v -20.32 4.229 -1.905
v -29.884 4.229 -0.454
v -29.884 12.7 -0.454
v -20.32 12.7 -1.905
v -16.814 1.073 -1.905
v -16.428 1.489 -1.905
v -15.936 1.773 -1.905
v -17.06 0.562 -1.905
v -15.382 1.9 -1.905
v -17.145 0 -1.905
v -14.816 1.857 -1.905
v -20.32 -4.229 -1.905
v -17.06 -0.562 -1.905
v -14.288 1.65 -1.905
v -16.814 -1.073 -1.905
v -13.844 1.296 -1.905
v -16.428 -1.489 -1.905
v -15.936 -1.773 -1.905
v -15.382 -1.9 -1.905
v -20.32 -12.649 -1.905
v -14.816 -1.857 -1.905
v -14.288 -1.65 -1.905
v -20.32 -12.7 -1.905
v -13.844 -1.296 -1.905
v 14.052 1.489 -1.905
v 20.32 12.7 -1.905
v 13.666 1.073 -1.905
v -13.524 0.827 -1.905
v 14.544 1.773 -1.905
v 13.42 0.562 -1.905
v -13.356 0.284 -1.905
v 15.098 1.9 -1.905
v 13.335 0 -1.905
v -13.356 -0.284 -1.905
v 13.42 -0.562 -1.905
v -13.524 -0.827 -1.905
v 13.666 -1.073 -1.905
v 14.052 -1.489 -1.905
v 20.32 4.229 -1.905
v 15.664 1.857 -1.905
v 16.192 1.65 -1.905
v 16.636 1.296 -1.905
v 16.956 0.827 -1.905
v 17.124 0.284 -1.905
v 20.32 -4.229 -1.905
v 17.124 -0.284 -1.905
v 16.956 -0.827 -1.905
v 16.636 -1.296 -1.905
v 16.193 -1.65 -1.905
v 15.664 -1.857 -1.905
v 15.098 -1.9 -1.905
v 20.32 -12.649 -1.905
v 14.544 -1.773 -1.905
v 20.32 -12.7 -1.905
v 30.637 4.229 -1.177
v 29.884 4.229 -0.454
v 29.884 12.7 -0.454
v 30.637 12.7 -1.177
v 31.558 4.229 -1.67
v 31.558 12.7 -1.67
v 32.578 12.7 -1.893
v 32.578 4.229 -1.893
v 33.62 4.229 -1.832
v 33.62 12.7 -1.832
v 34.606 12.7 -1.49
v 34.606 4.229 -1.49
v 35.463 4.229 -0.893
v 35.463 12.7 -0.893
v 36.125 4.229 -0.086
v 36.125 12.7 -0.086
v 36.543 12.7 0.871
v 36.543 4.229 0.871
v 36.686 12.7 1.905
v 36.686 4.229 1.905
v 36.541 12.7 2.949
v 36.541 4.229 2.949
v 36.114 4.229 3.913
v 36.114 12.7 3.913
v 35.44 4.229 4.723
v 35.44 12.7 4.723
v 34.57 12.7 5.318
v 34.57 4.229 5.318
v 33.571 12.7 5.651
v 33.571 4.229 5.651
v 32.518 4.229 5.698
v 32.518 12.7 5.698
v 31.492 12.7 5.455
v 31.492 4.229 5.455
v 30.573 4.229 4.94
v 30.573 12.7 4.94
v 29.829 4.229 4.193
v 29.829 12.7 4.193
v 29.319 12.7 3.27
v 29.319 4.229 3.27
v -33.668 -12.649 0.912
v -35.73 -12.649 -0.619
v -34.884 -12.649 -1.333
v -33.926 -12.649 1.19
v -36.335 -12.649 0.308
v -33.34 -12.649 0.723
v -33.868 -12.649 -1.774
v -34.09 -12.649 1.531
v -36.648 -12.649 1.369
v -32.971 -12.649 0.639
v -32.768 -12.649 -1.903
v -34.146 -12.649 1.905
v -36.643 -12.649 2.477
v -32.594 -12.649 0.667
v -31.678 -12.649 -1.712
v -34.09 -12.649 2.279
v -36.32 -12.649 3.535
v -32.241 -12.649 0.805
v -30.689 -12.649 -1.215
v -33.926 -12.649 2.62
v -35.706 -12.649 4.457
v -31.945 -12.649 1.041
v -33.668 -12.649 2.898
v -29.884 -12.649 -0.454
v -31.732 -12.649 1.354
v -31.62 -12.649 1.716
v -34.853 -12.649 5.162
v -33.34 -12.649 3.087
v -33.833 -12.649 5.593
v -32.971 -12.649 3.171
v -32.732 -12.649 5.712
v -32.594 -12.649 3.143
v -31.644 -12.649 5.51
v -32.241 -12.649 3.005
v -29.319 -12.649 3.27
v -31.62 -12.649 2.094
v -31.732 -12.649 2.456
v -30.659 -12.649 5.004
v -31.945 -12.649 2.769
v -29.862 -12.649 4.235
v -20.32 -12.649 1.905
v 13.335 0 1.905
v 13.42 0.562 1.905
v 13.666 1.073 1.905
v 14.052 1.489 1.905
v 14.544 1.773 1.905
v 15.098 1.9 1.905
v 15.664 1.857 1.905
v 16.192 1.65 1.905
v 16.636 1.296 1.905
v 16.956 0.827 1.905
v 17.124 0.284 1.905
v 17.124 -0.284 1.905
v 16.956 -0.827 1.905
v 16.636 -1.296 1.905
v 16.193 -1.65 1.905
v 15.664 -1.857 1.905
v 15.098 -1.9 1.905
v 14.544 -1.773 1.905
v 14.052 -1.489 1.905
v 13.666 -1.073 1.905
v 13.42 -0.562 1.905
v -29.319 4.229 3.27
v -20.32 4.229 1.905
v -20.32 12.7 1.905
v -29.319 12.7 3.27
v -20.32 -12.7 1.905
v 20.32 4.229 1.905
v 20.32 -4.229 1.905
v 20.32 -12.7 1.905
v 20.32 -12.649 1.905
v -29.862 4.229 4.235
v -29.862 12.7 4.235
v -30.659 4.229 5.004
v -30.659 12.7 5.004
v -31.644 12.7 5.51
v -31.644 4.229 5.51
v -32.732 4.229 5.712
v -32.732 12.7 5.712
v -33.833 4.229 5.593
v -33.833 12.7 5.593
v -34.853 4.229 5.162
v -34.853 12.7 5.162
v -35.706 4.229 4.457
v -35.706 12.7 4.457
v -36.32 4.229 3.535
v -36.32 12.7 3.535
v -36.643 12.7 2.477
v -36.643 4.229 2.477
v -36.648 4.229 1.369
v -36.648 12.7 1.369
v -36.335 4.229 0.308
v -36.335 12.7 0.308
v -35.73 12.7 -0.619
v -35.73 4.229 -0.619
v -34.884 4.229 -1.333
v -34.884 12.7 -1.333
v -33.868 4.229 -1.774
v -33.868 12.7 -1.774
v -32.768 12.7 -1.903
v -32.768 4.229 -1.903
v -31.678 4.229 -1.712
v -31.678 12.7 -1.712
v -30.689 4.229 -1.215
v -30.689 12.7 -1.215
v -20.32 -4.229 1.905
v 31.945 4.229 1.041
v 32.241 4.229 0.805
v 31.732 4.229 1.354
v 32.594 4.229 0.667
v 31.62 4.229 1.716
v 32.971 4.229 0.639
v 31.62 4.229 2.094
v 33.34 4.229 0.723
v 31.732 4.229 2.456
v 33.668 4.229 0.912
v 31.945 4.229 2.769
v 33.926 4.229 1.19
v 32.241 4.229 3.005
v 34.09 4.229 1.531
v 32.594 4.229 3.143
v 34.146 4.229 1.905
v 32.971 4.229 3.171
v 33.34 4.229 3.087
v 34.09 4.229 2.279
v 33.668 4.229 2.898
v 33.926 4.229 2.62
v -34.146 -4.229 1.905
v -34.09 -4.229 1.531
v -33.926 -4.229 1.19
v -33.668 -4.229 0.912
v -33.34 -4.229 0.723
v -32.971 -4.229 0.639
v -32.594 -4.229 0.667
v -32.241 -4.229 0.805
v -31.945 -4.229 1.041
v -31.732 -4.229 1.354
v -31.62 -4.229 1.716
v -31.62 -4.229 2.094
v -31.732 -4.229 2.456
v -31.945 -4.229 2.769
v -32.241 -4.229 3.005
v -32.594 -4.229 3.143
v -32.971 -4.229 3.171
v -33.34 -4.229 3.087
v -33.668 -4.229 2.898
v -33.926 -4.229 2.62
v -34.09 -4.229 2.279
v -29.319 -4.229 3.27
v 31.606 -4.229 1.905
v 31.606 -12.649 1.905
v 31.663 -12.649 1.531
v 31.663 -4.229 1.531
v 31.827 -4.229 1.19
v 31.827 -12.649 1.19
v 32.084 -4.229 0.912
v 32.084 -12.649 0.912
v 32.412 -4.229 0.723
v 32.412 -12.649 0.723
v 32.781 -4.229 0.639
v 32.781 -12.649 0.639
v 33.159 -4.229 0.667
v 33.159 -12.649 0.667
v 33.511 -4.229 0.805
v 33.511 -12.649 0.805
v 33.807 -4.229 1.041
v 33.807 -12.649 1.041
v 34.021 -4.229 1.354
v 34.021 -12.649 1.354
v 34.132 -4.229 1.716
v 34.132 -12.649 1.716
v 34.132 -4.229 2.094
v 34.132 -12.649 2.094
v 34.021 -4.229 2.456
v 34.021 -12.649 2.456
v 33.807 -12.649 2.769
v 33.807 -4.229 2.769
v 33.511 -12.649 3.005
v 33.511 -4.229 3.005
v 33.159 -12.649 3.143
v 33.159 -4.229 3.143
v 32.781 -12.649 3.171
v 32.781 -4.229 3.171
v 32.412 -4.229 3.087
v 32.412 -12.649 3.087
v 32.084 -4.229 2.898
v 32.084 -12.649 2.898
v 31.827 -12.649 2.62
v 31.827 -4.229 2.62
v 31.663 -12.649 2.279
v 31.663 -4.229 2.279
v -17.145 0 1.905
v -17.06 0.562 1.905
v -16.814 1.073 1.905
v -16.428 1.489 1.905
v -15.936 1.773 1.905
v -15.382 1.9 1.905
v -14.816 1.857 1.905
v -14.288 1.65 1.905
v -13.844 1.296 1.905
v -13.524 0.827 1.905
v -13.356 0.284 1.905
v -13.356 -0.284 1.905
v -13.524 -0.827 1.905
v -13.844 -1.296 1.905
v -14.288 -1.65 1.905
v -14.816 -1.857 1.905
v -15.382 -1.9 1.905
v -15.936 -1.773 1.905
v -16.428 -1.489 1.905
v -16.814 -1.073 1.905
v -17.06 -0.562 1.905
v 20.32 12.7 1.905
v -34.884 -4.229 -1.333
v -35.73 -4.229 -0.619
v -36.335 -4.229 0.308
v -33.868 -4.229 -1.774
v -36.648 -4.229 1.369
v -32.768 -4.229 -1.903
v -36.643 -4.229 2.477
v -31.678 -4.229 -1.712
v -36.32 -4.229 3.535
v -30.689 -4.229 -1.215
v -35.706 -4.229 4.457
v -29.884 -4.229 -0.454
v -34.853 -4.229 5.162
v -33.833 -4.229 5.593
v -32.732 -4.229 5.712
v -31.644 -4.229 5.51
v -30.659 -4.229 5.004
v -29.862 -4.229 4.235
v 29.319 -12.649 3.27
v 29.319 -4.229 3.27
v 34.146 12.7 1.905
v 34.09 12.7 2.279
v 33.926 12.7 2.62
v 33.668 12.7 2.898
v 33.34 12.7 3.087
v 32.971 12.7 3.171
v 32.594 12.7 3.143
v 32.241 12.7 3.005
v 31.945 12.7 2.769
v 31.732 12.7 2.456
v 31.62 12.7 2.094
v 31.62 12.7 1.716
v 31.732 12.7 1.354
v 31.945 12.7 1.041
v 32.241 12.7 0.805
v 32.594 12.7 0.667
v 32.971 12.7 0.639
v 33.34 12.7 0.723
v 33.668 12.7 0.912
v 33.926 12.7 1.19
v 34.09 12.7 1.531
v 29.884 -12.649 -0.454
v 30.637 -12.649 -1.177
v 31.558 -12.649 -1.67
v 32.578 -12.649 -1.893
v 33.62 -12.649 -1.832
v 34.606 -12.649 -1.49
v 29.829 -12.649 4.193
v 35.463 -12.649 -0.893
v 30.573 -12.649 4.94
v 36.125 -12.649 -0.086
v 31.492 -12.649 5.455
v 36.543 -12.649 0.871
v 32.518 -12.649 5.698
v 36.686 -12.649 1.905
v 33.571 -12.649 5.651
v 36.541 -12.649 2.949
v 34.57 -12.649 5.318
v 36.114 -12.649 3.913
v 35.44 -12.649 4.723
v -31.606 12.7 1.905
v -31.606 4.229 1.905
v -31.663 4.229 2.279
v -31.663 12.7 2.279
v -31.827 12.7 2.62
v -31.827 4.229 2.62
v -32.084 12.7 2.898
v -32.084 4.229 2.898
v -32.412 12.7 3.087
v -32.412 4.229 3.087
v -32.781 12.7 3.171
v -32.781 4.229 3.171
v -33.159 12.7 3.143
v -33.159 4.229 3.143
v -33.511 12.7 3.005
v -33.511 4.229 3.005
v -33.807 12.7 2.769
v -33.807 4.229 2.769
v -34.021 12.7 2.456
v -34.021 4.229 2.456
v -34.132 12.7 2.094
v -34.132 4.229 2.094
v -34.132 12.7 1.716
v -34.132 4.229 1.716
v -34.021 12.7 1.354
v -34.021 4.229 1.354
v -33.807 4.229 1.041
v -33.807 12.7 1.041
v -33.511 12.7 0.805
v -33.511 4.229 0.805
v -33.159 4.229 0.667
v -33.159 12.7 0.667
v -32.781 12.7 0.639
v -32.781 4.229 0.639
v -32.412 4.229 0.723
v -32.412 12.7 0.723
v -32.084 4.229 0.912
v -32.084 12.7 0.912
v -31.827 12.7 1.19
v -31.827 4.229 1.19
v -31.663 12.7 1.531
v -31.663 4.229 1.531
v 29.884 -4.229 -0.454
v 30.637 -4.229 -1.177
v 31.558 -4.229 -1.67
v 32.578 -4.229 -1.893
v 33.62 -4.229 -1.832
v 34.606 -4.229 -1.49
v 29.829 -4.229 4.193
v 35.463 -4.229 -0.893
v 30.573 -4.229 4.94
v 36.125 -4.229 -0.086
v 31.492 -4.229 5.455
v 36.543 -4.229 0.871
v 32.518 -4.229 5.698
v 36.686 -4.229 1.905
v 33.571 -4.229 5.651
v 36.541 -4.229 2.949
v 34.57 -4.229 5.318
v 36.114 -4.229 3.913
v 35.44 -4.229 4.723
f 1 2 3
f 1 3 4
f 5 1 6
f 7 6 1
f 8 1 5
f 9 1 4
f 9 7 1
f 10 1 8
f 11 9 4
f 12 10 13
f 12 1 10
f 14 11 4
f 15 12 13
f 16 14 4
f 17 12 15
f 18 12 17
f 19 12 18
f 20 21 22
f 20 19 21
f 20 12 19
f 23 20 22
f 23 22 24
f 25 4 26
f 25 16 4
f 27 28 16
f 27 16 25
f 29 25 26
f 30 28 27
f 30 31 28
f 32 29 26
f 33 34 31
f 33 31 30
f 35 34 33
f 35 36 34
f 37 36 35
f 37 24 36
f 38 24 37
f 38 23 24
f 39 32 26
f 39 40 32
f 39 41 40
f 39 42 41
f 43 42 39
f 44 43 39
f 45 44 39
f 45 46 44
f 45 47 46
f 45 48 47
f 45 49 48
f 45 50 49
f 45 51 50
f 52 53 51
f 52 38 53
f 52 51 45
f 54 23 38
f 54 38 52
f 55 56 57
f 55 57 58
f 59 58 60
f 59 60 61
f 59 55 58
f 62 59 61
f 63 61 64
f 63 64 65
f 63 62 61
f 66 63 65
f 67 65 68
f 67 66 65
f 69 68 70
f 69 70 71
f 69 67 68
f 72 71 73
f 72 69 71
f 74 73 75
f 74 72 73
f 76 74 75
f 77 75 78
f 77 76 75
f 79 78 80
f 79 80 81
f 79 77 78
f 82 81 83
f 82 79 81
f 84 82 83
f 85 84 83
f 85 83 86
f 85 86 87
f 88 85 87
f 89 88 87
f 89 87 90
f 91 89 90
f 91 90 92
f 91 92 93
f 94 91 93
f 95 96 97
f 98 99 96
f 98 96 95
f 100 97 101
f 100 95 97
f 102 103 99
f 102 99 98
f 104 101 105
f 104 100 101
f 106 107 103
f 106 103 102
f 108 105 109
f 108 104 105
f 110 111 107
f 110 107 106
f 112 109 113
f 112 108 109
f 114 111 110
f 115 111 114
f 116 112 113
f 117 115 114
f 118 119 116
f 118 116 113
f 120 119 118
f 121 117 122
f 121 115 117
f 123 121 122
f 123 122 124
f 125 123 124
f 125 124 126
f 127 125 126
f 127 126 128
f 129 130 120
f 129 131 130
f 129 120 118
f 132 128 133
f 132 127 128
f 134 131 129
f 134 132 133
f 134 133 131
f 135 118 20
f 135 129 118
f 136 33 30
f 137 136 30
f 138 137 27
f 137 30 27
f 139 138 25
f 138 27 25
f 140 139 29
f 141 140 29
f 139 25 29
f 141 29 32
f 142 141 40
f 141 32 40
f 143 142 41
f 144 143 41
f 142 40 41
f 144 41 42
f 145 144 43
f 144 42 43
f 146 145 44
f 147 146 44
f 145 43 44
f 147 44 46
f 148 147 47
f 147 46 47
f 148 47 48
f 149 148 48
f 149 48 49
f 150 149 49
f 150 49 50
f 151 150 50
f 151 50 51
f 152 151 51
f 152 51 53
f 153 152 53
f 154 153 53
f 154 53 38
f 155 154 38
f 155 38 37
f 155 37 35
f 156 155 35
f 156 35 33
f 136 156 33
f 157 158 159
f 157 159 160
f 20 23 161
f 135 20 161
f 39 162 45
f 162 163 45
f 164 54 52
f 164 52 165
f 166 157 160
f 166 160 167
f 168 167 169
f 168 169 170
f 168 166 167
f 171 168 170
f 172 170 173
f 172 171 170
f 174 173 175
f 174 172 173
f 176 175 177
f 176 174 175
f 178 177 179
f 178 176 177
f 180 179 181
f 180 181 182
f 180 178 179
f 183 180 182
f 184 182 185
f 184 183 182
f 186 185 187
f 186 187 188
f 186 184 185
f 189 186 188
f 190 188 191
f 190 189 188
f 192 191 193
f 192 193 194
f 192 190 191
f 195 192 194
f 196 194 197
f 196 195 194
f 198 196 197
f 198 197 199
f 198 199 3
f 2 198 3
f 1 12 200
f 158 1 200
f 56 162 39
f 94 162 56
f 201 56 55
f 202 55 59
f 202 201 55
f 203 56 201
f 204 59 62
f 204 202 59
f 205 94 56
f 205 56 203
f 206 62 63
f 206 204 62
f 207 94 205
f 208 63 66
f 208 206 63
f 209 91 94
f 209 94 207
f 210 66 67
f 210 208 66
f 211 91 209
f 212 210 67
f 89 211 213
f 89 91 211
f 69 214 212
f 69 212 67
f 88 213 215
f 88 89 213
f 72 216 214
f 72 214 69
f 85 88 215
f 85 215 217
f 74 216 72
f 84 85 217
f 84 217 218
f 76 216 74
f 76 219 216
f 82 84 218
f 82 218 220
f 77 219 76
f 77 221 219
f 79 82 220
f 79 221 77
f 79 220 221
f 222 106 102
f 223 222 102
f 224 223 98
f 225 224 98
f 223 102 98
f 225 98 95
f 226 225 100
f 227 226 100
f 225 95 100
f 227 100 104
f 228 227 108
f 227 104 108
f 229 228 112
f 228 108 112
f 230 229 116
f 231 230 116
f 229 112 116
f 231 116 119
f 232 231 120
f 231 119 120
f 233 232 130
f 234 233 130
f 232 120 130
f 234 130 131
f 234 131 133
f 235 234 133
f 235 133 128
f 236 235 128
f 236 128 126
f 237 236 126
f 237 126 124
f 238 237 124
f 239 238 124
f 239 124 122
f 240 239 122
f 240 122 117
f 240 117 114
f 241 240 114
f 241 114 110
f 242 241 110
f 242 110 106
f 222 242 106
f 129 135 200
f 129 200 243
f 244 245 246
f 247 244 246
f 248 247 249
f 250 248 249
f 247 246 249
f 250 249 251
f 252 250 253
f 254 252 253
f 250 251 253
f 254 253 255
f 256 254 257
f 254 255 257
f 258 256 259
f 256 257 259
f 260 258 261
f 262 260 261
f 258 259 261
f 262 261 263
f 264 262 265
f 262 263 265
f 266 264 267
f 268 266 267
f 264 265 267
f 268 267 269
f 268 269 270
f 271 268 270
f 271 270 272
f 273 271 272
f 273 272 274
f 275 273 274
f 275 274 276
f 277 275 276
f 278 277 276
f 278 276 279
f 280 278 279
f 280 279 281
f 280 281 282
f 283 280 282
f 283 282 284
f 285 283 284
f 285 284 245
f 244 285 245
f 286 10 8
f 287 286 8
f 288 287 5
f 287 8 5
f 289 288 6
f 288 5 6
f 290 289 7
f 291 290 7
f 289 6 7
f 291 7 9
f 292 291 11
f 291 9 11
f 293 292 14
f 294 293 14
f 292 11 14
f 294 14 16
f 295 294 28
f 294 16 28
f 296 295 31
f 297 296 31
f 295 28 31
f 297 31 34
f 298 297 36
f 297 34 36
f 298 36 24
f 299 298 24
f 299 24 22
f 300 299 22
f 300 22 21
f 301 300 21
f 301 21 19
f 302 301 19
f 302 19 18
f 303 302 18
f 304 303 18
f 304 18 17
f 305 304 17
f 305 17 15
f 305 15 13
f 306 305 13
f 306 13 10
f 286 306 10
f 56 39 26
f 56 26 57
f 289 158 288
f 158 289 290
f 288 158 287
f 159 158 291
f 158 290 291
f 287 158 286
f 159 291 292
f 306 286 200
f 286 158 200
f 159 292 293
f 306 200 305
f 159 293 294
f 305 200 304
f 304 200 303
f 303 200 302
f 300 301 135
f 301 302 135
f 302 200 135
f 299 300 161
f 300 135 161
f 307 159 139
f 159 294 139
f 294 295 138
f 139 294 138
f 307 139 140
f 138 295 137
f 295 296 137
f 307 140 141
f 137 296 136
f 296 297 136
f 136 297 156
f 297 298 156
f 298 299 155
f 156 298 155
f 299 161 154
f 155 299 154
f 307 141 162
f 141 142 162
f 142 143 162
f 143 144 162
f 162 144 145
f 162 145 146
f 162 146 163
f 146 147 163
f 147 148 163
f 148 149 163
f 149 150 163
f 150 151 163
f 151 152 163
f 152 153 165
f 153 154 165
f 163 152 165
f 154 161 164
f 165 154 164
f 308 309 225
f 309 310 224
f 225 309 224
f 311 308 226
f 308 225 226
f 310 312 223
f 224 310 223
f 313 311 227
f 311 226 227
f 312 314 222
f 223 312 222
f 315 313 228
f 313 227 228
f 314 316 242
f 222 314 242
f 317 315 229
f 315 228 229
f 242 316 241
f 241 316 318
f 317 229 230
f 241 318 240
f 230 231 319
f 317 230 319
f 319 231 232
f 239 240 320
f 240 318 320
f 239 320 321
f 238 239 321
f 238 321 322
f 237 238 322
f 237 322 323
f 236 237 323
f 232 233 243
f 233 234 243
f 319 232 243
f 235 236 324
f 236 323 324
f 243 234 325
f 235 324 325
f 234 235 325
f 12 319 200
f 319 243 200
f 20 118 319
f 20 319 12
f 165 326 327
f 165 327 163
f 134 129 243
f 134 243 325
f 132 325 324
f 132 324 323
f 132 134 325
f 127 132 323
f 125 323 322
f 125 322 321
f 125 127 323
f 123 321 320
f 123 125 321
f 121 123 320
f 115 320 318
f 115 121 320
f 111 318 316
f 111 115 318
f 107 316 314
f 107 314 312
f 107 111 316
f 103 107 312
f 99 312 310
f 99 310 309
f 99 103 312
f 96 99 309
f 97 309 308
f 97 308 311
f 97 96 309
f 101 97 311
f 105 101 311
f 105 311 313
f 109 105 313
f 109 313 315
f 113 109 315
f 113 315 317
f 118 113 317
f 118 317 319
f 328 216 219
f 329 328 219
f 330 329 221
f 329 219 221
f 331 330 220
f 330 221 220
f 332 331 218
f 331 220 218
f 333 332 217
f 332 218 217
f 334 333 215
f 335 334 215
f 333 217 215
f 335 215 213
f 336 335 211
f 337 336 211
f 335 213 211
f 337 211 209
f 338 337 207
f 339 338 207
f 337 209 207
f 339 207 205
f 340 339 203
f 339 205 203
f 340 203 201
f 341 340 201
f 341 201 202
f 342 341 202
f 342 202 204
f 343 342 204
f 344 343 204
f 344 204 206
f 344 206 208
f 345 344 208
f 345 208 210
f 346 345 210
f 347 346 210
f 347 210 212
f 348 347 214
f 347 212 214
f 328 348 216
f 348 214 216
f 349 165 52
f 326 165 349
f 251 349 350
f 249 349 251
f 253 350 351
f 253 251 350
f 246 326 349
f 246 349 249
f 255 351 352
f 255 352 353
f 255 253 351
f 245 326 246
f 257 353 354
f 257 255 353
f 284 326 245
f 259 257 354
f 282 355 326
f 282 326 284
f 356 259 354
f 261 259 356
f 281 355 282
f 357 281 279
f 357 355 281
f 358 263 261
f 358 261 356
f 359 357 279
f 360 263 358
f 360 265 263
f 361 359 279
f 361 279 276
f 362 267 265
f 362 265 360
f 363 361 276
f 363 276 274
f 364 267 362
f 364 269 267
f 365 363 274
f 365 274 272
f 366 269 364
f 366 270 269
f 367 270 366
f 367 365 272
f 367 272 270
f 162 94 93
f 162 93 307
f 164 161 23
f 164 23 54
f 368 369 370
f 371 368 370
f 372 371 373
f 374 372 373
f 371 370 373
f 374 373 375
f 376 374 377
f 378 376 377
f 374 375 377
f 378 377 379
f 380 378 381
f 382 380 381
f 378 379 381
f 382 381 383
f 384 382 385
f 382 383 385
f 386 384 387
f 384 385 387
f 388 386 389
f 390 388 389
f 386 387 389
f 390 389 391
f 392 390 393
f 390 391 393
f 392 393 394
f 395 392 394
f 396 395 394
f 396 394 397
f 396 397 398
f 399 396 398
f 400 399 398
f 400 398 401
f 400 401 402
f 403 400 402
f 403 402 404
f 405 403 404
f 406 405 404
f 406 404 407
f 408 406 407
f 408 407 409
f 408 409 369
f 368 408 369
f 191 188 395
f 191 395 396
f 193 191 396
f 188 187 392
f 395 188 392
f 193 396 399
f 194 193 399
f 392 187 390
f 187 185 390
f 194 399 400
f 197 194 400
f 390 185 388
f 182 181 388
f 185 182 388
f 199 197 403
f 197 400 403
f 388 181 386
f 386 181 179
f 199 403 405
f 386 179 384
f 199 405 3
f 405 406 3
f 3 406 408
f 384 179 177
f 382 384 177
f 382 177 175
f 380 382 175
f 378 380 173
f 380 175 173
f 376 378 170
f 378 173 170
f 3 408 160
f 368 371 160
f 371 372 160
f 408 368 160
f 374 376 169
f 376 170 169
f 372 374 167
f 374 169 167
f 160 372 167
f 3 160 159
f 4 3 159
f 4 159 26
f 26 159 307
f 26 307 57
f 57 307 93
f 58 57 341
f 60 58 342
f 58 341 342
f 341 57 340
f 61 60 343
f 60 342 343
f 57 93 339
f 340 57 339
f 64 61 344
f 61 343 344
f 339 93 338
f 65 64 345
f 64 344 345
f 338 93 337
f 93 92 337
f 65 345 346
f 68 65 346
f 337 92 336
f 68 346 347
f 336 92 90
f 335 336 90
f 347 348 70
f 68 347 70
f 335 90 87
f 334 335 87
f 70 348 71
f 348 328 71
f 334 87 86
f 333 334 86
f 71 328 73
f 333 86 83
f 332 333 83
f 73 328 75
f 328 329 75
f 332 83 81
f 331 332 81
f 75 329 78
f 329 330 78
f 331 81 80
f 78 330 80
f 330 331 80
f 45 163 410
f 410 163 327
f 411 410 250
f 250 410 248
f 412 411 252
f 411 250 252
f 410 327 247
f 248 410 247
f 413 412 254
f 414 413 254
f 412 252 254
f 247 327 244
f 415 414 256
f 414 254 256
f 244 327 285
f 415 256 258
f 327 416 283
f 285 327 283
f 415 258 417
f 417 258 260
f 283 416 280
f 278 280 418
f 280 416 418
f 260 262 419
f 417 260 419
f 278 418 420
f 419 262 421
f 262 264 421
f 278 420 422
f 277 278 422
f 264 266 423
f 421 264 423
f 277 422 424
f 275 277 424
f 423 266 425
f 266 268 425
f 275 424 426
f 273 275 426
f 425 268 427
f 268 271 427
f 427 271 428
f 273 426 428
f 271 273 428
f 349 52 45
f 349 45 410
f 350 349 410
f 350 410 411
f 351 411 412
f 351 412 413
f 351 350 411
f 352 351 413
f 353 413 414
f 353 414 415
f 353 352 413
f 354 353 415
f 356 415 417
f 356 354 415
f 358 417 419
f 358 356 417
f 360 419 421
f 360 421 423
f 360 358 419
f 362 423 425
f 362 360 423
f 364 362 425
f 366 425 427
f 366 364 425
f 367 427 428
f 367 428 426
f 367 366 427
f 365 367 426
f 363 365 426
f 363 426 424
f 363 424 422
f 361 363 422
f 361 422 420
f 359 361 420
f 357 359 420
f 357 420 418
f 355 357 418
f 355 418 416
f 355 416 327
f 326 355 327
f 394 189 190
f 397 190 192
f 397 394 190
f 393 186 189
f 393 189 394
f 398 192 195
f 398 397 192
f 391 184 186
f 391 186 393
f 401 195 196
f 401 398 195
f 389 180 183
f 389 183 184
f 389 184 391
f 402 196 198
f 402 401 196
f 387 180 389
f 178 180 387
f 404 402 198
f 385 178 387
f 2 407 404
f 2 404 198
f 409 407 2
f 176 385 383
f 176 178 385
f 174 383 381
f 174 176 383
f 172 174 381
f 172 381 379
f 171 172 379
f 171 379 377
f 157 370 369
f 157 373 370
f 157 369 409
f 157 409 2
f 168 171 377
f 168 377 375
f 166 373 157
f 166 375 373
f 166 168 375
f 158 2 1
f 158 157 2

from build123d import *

# Parameters (mm, degrees)
F0_W          = 40.64
F0_H          = 3.81
F1_DEPTH      = 12.7
F2_DEPTH      = 12.6492
F2_DEPTH_BACK = 12.7
F3_D          = 2.54
F3_DEPTH      = 12.701
F4_D          = 2.54
F6_DEPTH      = 4.2291
F7_DEPTH      = 4.2291
F8_D          = 3.81


with BuildPart() as f1:
    # F0 (on Front) → F1 (new body, symmetric)
    with BuildSketch(Plane.XZ):
        Rectangle(F0_W, F0_H)
    extrude(amount=F1_DEPTH, both=True)

    # F0 (on Front) → F2 (join, two sides)
    with BuildSketch(Plane.XZ) as f2_sk:
        with BuildLine():
            Line((20.32, 1.905), (20.32, -1.905))
            Line((20.32, -1.905), (29.8843930952, -0.4539235519))
            ThreePointArc((29.8843930952, -0.4539235519), (29.1094185103, 1.3335), (29.3193590481, 3.2703514481))
            Line((29.3193590481, 3.2703514481), (20.32, 1.905))
        make_face()
        with BuildLine():
            Line((32.8763121576, 0), (29.8843930952, -0.4539235519))
            ThreePointArc((29.8843930952, -0.4539235519), (34.1246887779, -1.6946744039), (36.6863121576, 1.905))
            ThreePointArc((36.6863121576, 1.905), (33.5706134801, 5.6512041687), (29.3193590481, 3.2703514481))
            Line((29.3193590481, 3.2703514481), (32.8763121576, 3.81))
            Line((32.8763121576, 3.81), (32.8763121576, 0))
        make_face()
        with BuildLine():
            ThreePointArc((29.3193590481, 3.2703514481), (29.1094185103, 1.3335), (29.8843930952, -0.4539235519))
            Line((29.8843930952, -0.4539235519), (32.8763121576, 0))
            Line((32.8763121576, 0), (32.8763121576, 3.81))
            Line((32.8763121576, 3.81), (29.3193590481, 3.2703514481))
        make_face()
        with BuildLine():
            Line((-29.8843930952, -0.4539235519), (-20.32, -1.905))
            Line((-20.32, -1.905), (-20.32, 1.905))
            Line((-20.32, 1.905), (-29.3193590481, 3.2703514481))
            ThreePointArc((-29.3193590481, 3.2703514481), (-29.1301079889, 2.5993013225), (-29.0663121576, 1.905))
            ThreePointArc((-29.0663121576, 1.905), (-29.2766377538, 0.6566233797), (-29.8843930952, -0.4539235519))
        make_face()
        with BuildLine():
            ThreePointArc((-29.3193590481, 3.2703514481), (-36.6432058049, 2.4765), (-29.8843930952, -0.4539235519))
            Line((-29.8843930952, -0.4539235519), (-32.8763121576, 0))
            Line((-32.8763121576, 0), (-32.8763121576, 3.81))
            Line((-32.8763121576, 3.81), (-29.3193590481, 3.2703514481))
        make_face()
        with BuildLine():
            Line((-32.8763121576, 0), (-29.8843930952, -0.4539235519))
            ThreePointArc((-29.8843930952, -0.4539235519), (-29.2766377538, 0.6566233797), (-29.0663121576, 1.905))
            ThreePointArc((-29.0663121576, 1.905), (-29.1301079889, 2.5993013225), (-29.3193590481, 3.2703514481))
            Line((-29.3193590481, 3.2703514481), (-32.8763121576, 3.81))
            Line((-32.8763121576, 3.81), (-32.8763121576, 0))
        make_face()
    extrude(amount=F2_DEPTH)
    extrude(f2_sk.sketch, amount=-F2_DEPTH_BACK)

    # F3 (through all, one way)
    with BuildSketch(Plane.XZ):
        with Locations((32.8763121576, 1.905), (-32.8763121576, 1.905)):
            Circle(F3_D / 2)
    extrude(amount=-F3_DEPTH, mode=Mode.SUBTRACT)

    # F4 (through all)
    with Locations(Plane(origin=(0, 0, 0), x_dir=(1, 0, 0), z_dir=(0, 1, 0))):
        with Locations((32.8763121576, -1.905), (-32.8763121576, -1.905)):
            Hole(F4_D / 2)

    # F0 (on Front) → F6 (cut, symmetric)
    with BuildSketch(Plane.XZ):
        with BuildLine():
            Line((20.32, 1.905), (20.32, -1.905))
            Line((20.32, -1.905), (29.8843930952, -0.4539235519))
            ThreePointArc((29.8843930952, -0.4539235519), (29.1094185103, 1.3335), (29.3193590481, 3.2703514481))
            Line((29.3193590481, 3.2703514481), (20.32, 1.905))
        make_face()
        with BuildLine():
            Line((32.8763121576, 0), (29.8843930952, -0.4539235519))
            ThreePointArc((29.8843930952, -0.4539235519), (34.1246887779, -1.6946744039), (36.6863121576, 1.905))
            ThreePointArc((36.6863121576, 1.905), (33.5706134801, 5.6512041687), (29.3193590481, 3.2703514481))
            Line((29.3193590481, 3.2703514481), (32.8763121576, 3.81))
            Line((32.8763121576, 3.81), (32.8763121576, 0))
        make_face()
        with BuildLine():
            ThreePointArc((29.3193590481, 3.2703514481), (29.1094185103, 1.3335), (29.8843930952, -0.4539235519))
            Line((29.8843930952, -0.4539235519), (32.8763121576, 0))
            Line((32.8763121576, 0), (32.8763121576, 3.81))
            Line((32.8763121576, 3.81), (29.3193590481, 3.2703514481))
        make_face()
    extrude(amount=F6_DEPTH, both=True, mode=Mode.SUBTRACT)

    # F0 (on Front) → F7 (cut, symmetric)
    with BuildSketch(Plane.XZ):
        with BuildLine():
            Line((-29.8843930952, -0.4539235519), (-20.32, -1.905))
            Line((-20.32, -1.905), (-20.32, 1.905))
            Line((-20.32, 1.905), (-29.3193590481, 3.2703514481))
            ThreePointArc((-29.3193590481, 3.2703514481), (-29.1301079889, 2.5993013225), (-29.0663121576, 1.905))
            ThreePointArc((-29.0663121576, 1.905), (-29.2766377538, 0.6566233797), (-29.8843930952, -0.4539235519))
        make_face()
        with BuildLine():
            Line((-32.8763121576, 0), (-29.8843930952, -0.4539235519))
            ThreePointArc((-29.8843930952, -0.4539235519), (-29.2766377538, 0.6566233797), (-29.0663121576, 1.905))
            ThreePointArc((-29.0663121576, 1.905), (-29.1301079889, 2.5993013225), (-29.3193590481, 3.2703514481))
            Line((-29.3193590481, 3.2703514481), (-32.8763121576, 3.81))
            Line((-32.8763121576, 3.81), (-32.8763121576, 0))
        make_face()
        with BuildLine():
            ThreePointArc((-29.3193590481, 3.2703514481), (-36.6432058049, 2.4765), (-29.8843930952, -0.4539235519))
            Line((-29.8843930952, -0.4539235519), (-32.8763121576, 0))
            Line((-32.8763121576, 0), (-32.8763121576, 3.81))
            Line((-32.8763121576, 3.81), (-29.3193590481, 3.2703514481))
        make_face()
    extrude(amount=F7_DEPTH, both=True, mode=Mode.SUBTRACT)

    # F8 (through all)
    with Locations(Plane.XY.offset(1.905)):
        with Locations((-15.24, 0), (15.24, 0)):
            Hole(F8_D / 2)


solid = f1.part
